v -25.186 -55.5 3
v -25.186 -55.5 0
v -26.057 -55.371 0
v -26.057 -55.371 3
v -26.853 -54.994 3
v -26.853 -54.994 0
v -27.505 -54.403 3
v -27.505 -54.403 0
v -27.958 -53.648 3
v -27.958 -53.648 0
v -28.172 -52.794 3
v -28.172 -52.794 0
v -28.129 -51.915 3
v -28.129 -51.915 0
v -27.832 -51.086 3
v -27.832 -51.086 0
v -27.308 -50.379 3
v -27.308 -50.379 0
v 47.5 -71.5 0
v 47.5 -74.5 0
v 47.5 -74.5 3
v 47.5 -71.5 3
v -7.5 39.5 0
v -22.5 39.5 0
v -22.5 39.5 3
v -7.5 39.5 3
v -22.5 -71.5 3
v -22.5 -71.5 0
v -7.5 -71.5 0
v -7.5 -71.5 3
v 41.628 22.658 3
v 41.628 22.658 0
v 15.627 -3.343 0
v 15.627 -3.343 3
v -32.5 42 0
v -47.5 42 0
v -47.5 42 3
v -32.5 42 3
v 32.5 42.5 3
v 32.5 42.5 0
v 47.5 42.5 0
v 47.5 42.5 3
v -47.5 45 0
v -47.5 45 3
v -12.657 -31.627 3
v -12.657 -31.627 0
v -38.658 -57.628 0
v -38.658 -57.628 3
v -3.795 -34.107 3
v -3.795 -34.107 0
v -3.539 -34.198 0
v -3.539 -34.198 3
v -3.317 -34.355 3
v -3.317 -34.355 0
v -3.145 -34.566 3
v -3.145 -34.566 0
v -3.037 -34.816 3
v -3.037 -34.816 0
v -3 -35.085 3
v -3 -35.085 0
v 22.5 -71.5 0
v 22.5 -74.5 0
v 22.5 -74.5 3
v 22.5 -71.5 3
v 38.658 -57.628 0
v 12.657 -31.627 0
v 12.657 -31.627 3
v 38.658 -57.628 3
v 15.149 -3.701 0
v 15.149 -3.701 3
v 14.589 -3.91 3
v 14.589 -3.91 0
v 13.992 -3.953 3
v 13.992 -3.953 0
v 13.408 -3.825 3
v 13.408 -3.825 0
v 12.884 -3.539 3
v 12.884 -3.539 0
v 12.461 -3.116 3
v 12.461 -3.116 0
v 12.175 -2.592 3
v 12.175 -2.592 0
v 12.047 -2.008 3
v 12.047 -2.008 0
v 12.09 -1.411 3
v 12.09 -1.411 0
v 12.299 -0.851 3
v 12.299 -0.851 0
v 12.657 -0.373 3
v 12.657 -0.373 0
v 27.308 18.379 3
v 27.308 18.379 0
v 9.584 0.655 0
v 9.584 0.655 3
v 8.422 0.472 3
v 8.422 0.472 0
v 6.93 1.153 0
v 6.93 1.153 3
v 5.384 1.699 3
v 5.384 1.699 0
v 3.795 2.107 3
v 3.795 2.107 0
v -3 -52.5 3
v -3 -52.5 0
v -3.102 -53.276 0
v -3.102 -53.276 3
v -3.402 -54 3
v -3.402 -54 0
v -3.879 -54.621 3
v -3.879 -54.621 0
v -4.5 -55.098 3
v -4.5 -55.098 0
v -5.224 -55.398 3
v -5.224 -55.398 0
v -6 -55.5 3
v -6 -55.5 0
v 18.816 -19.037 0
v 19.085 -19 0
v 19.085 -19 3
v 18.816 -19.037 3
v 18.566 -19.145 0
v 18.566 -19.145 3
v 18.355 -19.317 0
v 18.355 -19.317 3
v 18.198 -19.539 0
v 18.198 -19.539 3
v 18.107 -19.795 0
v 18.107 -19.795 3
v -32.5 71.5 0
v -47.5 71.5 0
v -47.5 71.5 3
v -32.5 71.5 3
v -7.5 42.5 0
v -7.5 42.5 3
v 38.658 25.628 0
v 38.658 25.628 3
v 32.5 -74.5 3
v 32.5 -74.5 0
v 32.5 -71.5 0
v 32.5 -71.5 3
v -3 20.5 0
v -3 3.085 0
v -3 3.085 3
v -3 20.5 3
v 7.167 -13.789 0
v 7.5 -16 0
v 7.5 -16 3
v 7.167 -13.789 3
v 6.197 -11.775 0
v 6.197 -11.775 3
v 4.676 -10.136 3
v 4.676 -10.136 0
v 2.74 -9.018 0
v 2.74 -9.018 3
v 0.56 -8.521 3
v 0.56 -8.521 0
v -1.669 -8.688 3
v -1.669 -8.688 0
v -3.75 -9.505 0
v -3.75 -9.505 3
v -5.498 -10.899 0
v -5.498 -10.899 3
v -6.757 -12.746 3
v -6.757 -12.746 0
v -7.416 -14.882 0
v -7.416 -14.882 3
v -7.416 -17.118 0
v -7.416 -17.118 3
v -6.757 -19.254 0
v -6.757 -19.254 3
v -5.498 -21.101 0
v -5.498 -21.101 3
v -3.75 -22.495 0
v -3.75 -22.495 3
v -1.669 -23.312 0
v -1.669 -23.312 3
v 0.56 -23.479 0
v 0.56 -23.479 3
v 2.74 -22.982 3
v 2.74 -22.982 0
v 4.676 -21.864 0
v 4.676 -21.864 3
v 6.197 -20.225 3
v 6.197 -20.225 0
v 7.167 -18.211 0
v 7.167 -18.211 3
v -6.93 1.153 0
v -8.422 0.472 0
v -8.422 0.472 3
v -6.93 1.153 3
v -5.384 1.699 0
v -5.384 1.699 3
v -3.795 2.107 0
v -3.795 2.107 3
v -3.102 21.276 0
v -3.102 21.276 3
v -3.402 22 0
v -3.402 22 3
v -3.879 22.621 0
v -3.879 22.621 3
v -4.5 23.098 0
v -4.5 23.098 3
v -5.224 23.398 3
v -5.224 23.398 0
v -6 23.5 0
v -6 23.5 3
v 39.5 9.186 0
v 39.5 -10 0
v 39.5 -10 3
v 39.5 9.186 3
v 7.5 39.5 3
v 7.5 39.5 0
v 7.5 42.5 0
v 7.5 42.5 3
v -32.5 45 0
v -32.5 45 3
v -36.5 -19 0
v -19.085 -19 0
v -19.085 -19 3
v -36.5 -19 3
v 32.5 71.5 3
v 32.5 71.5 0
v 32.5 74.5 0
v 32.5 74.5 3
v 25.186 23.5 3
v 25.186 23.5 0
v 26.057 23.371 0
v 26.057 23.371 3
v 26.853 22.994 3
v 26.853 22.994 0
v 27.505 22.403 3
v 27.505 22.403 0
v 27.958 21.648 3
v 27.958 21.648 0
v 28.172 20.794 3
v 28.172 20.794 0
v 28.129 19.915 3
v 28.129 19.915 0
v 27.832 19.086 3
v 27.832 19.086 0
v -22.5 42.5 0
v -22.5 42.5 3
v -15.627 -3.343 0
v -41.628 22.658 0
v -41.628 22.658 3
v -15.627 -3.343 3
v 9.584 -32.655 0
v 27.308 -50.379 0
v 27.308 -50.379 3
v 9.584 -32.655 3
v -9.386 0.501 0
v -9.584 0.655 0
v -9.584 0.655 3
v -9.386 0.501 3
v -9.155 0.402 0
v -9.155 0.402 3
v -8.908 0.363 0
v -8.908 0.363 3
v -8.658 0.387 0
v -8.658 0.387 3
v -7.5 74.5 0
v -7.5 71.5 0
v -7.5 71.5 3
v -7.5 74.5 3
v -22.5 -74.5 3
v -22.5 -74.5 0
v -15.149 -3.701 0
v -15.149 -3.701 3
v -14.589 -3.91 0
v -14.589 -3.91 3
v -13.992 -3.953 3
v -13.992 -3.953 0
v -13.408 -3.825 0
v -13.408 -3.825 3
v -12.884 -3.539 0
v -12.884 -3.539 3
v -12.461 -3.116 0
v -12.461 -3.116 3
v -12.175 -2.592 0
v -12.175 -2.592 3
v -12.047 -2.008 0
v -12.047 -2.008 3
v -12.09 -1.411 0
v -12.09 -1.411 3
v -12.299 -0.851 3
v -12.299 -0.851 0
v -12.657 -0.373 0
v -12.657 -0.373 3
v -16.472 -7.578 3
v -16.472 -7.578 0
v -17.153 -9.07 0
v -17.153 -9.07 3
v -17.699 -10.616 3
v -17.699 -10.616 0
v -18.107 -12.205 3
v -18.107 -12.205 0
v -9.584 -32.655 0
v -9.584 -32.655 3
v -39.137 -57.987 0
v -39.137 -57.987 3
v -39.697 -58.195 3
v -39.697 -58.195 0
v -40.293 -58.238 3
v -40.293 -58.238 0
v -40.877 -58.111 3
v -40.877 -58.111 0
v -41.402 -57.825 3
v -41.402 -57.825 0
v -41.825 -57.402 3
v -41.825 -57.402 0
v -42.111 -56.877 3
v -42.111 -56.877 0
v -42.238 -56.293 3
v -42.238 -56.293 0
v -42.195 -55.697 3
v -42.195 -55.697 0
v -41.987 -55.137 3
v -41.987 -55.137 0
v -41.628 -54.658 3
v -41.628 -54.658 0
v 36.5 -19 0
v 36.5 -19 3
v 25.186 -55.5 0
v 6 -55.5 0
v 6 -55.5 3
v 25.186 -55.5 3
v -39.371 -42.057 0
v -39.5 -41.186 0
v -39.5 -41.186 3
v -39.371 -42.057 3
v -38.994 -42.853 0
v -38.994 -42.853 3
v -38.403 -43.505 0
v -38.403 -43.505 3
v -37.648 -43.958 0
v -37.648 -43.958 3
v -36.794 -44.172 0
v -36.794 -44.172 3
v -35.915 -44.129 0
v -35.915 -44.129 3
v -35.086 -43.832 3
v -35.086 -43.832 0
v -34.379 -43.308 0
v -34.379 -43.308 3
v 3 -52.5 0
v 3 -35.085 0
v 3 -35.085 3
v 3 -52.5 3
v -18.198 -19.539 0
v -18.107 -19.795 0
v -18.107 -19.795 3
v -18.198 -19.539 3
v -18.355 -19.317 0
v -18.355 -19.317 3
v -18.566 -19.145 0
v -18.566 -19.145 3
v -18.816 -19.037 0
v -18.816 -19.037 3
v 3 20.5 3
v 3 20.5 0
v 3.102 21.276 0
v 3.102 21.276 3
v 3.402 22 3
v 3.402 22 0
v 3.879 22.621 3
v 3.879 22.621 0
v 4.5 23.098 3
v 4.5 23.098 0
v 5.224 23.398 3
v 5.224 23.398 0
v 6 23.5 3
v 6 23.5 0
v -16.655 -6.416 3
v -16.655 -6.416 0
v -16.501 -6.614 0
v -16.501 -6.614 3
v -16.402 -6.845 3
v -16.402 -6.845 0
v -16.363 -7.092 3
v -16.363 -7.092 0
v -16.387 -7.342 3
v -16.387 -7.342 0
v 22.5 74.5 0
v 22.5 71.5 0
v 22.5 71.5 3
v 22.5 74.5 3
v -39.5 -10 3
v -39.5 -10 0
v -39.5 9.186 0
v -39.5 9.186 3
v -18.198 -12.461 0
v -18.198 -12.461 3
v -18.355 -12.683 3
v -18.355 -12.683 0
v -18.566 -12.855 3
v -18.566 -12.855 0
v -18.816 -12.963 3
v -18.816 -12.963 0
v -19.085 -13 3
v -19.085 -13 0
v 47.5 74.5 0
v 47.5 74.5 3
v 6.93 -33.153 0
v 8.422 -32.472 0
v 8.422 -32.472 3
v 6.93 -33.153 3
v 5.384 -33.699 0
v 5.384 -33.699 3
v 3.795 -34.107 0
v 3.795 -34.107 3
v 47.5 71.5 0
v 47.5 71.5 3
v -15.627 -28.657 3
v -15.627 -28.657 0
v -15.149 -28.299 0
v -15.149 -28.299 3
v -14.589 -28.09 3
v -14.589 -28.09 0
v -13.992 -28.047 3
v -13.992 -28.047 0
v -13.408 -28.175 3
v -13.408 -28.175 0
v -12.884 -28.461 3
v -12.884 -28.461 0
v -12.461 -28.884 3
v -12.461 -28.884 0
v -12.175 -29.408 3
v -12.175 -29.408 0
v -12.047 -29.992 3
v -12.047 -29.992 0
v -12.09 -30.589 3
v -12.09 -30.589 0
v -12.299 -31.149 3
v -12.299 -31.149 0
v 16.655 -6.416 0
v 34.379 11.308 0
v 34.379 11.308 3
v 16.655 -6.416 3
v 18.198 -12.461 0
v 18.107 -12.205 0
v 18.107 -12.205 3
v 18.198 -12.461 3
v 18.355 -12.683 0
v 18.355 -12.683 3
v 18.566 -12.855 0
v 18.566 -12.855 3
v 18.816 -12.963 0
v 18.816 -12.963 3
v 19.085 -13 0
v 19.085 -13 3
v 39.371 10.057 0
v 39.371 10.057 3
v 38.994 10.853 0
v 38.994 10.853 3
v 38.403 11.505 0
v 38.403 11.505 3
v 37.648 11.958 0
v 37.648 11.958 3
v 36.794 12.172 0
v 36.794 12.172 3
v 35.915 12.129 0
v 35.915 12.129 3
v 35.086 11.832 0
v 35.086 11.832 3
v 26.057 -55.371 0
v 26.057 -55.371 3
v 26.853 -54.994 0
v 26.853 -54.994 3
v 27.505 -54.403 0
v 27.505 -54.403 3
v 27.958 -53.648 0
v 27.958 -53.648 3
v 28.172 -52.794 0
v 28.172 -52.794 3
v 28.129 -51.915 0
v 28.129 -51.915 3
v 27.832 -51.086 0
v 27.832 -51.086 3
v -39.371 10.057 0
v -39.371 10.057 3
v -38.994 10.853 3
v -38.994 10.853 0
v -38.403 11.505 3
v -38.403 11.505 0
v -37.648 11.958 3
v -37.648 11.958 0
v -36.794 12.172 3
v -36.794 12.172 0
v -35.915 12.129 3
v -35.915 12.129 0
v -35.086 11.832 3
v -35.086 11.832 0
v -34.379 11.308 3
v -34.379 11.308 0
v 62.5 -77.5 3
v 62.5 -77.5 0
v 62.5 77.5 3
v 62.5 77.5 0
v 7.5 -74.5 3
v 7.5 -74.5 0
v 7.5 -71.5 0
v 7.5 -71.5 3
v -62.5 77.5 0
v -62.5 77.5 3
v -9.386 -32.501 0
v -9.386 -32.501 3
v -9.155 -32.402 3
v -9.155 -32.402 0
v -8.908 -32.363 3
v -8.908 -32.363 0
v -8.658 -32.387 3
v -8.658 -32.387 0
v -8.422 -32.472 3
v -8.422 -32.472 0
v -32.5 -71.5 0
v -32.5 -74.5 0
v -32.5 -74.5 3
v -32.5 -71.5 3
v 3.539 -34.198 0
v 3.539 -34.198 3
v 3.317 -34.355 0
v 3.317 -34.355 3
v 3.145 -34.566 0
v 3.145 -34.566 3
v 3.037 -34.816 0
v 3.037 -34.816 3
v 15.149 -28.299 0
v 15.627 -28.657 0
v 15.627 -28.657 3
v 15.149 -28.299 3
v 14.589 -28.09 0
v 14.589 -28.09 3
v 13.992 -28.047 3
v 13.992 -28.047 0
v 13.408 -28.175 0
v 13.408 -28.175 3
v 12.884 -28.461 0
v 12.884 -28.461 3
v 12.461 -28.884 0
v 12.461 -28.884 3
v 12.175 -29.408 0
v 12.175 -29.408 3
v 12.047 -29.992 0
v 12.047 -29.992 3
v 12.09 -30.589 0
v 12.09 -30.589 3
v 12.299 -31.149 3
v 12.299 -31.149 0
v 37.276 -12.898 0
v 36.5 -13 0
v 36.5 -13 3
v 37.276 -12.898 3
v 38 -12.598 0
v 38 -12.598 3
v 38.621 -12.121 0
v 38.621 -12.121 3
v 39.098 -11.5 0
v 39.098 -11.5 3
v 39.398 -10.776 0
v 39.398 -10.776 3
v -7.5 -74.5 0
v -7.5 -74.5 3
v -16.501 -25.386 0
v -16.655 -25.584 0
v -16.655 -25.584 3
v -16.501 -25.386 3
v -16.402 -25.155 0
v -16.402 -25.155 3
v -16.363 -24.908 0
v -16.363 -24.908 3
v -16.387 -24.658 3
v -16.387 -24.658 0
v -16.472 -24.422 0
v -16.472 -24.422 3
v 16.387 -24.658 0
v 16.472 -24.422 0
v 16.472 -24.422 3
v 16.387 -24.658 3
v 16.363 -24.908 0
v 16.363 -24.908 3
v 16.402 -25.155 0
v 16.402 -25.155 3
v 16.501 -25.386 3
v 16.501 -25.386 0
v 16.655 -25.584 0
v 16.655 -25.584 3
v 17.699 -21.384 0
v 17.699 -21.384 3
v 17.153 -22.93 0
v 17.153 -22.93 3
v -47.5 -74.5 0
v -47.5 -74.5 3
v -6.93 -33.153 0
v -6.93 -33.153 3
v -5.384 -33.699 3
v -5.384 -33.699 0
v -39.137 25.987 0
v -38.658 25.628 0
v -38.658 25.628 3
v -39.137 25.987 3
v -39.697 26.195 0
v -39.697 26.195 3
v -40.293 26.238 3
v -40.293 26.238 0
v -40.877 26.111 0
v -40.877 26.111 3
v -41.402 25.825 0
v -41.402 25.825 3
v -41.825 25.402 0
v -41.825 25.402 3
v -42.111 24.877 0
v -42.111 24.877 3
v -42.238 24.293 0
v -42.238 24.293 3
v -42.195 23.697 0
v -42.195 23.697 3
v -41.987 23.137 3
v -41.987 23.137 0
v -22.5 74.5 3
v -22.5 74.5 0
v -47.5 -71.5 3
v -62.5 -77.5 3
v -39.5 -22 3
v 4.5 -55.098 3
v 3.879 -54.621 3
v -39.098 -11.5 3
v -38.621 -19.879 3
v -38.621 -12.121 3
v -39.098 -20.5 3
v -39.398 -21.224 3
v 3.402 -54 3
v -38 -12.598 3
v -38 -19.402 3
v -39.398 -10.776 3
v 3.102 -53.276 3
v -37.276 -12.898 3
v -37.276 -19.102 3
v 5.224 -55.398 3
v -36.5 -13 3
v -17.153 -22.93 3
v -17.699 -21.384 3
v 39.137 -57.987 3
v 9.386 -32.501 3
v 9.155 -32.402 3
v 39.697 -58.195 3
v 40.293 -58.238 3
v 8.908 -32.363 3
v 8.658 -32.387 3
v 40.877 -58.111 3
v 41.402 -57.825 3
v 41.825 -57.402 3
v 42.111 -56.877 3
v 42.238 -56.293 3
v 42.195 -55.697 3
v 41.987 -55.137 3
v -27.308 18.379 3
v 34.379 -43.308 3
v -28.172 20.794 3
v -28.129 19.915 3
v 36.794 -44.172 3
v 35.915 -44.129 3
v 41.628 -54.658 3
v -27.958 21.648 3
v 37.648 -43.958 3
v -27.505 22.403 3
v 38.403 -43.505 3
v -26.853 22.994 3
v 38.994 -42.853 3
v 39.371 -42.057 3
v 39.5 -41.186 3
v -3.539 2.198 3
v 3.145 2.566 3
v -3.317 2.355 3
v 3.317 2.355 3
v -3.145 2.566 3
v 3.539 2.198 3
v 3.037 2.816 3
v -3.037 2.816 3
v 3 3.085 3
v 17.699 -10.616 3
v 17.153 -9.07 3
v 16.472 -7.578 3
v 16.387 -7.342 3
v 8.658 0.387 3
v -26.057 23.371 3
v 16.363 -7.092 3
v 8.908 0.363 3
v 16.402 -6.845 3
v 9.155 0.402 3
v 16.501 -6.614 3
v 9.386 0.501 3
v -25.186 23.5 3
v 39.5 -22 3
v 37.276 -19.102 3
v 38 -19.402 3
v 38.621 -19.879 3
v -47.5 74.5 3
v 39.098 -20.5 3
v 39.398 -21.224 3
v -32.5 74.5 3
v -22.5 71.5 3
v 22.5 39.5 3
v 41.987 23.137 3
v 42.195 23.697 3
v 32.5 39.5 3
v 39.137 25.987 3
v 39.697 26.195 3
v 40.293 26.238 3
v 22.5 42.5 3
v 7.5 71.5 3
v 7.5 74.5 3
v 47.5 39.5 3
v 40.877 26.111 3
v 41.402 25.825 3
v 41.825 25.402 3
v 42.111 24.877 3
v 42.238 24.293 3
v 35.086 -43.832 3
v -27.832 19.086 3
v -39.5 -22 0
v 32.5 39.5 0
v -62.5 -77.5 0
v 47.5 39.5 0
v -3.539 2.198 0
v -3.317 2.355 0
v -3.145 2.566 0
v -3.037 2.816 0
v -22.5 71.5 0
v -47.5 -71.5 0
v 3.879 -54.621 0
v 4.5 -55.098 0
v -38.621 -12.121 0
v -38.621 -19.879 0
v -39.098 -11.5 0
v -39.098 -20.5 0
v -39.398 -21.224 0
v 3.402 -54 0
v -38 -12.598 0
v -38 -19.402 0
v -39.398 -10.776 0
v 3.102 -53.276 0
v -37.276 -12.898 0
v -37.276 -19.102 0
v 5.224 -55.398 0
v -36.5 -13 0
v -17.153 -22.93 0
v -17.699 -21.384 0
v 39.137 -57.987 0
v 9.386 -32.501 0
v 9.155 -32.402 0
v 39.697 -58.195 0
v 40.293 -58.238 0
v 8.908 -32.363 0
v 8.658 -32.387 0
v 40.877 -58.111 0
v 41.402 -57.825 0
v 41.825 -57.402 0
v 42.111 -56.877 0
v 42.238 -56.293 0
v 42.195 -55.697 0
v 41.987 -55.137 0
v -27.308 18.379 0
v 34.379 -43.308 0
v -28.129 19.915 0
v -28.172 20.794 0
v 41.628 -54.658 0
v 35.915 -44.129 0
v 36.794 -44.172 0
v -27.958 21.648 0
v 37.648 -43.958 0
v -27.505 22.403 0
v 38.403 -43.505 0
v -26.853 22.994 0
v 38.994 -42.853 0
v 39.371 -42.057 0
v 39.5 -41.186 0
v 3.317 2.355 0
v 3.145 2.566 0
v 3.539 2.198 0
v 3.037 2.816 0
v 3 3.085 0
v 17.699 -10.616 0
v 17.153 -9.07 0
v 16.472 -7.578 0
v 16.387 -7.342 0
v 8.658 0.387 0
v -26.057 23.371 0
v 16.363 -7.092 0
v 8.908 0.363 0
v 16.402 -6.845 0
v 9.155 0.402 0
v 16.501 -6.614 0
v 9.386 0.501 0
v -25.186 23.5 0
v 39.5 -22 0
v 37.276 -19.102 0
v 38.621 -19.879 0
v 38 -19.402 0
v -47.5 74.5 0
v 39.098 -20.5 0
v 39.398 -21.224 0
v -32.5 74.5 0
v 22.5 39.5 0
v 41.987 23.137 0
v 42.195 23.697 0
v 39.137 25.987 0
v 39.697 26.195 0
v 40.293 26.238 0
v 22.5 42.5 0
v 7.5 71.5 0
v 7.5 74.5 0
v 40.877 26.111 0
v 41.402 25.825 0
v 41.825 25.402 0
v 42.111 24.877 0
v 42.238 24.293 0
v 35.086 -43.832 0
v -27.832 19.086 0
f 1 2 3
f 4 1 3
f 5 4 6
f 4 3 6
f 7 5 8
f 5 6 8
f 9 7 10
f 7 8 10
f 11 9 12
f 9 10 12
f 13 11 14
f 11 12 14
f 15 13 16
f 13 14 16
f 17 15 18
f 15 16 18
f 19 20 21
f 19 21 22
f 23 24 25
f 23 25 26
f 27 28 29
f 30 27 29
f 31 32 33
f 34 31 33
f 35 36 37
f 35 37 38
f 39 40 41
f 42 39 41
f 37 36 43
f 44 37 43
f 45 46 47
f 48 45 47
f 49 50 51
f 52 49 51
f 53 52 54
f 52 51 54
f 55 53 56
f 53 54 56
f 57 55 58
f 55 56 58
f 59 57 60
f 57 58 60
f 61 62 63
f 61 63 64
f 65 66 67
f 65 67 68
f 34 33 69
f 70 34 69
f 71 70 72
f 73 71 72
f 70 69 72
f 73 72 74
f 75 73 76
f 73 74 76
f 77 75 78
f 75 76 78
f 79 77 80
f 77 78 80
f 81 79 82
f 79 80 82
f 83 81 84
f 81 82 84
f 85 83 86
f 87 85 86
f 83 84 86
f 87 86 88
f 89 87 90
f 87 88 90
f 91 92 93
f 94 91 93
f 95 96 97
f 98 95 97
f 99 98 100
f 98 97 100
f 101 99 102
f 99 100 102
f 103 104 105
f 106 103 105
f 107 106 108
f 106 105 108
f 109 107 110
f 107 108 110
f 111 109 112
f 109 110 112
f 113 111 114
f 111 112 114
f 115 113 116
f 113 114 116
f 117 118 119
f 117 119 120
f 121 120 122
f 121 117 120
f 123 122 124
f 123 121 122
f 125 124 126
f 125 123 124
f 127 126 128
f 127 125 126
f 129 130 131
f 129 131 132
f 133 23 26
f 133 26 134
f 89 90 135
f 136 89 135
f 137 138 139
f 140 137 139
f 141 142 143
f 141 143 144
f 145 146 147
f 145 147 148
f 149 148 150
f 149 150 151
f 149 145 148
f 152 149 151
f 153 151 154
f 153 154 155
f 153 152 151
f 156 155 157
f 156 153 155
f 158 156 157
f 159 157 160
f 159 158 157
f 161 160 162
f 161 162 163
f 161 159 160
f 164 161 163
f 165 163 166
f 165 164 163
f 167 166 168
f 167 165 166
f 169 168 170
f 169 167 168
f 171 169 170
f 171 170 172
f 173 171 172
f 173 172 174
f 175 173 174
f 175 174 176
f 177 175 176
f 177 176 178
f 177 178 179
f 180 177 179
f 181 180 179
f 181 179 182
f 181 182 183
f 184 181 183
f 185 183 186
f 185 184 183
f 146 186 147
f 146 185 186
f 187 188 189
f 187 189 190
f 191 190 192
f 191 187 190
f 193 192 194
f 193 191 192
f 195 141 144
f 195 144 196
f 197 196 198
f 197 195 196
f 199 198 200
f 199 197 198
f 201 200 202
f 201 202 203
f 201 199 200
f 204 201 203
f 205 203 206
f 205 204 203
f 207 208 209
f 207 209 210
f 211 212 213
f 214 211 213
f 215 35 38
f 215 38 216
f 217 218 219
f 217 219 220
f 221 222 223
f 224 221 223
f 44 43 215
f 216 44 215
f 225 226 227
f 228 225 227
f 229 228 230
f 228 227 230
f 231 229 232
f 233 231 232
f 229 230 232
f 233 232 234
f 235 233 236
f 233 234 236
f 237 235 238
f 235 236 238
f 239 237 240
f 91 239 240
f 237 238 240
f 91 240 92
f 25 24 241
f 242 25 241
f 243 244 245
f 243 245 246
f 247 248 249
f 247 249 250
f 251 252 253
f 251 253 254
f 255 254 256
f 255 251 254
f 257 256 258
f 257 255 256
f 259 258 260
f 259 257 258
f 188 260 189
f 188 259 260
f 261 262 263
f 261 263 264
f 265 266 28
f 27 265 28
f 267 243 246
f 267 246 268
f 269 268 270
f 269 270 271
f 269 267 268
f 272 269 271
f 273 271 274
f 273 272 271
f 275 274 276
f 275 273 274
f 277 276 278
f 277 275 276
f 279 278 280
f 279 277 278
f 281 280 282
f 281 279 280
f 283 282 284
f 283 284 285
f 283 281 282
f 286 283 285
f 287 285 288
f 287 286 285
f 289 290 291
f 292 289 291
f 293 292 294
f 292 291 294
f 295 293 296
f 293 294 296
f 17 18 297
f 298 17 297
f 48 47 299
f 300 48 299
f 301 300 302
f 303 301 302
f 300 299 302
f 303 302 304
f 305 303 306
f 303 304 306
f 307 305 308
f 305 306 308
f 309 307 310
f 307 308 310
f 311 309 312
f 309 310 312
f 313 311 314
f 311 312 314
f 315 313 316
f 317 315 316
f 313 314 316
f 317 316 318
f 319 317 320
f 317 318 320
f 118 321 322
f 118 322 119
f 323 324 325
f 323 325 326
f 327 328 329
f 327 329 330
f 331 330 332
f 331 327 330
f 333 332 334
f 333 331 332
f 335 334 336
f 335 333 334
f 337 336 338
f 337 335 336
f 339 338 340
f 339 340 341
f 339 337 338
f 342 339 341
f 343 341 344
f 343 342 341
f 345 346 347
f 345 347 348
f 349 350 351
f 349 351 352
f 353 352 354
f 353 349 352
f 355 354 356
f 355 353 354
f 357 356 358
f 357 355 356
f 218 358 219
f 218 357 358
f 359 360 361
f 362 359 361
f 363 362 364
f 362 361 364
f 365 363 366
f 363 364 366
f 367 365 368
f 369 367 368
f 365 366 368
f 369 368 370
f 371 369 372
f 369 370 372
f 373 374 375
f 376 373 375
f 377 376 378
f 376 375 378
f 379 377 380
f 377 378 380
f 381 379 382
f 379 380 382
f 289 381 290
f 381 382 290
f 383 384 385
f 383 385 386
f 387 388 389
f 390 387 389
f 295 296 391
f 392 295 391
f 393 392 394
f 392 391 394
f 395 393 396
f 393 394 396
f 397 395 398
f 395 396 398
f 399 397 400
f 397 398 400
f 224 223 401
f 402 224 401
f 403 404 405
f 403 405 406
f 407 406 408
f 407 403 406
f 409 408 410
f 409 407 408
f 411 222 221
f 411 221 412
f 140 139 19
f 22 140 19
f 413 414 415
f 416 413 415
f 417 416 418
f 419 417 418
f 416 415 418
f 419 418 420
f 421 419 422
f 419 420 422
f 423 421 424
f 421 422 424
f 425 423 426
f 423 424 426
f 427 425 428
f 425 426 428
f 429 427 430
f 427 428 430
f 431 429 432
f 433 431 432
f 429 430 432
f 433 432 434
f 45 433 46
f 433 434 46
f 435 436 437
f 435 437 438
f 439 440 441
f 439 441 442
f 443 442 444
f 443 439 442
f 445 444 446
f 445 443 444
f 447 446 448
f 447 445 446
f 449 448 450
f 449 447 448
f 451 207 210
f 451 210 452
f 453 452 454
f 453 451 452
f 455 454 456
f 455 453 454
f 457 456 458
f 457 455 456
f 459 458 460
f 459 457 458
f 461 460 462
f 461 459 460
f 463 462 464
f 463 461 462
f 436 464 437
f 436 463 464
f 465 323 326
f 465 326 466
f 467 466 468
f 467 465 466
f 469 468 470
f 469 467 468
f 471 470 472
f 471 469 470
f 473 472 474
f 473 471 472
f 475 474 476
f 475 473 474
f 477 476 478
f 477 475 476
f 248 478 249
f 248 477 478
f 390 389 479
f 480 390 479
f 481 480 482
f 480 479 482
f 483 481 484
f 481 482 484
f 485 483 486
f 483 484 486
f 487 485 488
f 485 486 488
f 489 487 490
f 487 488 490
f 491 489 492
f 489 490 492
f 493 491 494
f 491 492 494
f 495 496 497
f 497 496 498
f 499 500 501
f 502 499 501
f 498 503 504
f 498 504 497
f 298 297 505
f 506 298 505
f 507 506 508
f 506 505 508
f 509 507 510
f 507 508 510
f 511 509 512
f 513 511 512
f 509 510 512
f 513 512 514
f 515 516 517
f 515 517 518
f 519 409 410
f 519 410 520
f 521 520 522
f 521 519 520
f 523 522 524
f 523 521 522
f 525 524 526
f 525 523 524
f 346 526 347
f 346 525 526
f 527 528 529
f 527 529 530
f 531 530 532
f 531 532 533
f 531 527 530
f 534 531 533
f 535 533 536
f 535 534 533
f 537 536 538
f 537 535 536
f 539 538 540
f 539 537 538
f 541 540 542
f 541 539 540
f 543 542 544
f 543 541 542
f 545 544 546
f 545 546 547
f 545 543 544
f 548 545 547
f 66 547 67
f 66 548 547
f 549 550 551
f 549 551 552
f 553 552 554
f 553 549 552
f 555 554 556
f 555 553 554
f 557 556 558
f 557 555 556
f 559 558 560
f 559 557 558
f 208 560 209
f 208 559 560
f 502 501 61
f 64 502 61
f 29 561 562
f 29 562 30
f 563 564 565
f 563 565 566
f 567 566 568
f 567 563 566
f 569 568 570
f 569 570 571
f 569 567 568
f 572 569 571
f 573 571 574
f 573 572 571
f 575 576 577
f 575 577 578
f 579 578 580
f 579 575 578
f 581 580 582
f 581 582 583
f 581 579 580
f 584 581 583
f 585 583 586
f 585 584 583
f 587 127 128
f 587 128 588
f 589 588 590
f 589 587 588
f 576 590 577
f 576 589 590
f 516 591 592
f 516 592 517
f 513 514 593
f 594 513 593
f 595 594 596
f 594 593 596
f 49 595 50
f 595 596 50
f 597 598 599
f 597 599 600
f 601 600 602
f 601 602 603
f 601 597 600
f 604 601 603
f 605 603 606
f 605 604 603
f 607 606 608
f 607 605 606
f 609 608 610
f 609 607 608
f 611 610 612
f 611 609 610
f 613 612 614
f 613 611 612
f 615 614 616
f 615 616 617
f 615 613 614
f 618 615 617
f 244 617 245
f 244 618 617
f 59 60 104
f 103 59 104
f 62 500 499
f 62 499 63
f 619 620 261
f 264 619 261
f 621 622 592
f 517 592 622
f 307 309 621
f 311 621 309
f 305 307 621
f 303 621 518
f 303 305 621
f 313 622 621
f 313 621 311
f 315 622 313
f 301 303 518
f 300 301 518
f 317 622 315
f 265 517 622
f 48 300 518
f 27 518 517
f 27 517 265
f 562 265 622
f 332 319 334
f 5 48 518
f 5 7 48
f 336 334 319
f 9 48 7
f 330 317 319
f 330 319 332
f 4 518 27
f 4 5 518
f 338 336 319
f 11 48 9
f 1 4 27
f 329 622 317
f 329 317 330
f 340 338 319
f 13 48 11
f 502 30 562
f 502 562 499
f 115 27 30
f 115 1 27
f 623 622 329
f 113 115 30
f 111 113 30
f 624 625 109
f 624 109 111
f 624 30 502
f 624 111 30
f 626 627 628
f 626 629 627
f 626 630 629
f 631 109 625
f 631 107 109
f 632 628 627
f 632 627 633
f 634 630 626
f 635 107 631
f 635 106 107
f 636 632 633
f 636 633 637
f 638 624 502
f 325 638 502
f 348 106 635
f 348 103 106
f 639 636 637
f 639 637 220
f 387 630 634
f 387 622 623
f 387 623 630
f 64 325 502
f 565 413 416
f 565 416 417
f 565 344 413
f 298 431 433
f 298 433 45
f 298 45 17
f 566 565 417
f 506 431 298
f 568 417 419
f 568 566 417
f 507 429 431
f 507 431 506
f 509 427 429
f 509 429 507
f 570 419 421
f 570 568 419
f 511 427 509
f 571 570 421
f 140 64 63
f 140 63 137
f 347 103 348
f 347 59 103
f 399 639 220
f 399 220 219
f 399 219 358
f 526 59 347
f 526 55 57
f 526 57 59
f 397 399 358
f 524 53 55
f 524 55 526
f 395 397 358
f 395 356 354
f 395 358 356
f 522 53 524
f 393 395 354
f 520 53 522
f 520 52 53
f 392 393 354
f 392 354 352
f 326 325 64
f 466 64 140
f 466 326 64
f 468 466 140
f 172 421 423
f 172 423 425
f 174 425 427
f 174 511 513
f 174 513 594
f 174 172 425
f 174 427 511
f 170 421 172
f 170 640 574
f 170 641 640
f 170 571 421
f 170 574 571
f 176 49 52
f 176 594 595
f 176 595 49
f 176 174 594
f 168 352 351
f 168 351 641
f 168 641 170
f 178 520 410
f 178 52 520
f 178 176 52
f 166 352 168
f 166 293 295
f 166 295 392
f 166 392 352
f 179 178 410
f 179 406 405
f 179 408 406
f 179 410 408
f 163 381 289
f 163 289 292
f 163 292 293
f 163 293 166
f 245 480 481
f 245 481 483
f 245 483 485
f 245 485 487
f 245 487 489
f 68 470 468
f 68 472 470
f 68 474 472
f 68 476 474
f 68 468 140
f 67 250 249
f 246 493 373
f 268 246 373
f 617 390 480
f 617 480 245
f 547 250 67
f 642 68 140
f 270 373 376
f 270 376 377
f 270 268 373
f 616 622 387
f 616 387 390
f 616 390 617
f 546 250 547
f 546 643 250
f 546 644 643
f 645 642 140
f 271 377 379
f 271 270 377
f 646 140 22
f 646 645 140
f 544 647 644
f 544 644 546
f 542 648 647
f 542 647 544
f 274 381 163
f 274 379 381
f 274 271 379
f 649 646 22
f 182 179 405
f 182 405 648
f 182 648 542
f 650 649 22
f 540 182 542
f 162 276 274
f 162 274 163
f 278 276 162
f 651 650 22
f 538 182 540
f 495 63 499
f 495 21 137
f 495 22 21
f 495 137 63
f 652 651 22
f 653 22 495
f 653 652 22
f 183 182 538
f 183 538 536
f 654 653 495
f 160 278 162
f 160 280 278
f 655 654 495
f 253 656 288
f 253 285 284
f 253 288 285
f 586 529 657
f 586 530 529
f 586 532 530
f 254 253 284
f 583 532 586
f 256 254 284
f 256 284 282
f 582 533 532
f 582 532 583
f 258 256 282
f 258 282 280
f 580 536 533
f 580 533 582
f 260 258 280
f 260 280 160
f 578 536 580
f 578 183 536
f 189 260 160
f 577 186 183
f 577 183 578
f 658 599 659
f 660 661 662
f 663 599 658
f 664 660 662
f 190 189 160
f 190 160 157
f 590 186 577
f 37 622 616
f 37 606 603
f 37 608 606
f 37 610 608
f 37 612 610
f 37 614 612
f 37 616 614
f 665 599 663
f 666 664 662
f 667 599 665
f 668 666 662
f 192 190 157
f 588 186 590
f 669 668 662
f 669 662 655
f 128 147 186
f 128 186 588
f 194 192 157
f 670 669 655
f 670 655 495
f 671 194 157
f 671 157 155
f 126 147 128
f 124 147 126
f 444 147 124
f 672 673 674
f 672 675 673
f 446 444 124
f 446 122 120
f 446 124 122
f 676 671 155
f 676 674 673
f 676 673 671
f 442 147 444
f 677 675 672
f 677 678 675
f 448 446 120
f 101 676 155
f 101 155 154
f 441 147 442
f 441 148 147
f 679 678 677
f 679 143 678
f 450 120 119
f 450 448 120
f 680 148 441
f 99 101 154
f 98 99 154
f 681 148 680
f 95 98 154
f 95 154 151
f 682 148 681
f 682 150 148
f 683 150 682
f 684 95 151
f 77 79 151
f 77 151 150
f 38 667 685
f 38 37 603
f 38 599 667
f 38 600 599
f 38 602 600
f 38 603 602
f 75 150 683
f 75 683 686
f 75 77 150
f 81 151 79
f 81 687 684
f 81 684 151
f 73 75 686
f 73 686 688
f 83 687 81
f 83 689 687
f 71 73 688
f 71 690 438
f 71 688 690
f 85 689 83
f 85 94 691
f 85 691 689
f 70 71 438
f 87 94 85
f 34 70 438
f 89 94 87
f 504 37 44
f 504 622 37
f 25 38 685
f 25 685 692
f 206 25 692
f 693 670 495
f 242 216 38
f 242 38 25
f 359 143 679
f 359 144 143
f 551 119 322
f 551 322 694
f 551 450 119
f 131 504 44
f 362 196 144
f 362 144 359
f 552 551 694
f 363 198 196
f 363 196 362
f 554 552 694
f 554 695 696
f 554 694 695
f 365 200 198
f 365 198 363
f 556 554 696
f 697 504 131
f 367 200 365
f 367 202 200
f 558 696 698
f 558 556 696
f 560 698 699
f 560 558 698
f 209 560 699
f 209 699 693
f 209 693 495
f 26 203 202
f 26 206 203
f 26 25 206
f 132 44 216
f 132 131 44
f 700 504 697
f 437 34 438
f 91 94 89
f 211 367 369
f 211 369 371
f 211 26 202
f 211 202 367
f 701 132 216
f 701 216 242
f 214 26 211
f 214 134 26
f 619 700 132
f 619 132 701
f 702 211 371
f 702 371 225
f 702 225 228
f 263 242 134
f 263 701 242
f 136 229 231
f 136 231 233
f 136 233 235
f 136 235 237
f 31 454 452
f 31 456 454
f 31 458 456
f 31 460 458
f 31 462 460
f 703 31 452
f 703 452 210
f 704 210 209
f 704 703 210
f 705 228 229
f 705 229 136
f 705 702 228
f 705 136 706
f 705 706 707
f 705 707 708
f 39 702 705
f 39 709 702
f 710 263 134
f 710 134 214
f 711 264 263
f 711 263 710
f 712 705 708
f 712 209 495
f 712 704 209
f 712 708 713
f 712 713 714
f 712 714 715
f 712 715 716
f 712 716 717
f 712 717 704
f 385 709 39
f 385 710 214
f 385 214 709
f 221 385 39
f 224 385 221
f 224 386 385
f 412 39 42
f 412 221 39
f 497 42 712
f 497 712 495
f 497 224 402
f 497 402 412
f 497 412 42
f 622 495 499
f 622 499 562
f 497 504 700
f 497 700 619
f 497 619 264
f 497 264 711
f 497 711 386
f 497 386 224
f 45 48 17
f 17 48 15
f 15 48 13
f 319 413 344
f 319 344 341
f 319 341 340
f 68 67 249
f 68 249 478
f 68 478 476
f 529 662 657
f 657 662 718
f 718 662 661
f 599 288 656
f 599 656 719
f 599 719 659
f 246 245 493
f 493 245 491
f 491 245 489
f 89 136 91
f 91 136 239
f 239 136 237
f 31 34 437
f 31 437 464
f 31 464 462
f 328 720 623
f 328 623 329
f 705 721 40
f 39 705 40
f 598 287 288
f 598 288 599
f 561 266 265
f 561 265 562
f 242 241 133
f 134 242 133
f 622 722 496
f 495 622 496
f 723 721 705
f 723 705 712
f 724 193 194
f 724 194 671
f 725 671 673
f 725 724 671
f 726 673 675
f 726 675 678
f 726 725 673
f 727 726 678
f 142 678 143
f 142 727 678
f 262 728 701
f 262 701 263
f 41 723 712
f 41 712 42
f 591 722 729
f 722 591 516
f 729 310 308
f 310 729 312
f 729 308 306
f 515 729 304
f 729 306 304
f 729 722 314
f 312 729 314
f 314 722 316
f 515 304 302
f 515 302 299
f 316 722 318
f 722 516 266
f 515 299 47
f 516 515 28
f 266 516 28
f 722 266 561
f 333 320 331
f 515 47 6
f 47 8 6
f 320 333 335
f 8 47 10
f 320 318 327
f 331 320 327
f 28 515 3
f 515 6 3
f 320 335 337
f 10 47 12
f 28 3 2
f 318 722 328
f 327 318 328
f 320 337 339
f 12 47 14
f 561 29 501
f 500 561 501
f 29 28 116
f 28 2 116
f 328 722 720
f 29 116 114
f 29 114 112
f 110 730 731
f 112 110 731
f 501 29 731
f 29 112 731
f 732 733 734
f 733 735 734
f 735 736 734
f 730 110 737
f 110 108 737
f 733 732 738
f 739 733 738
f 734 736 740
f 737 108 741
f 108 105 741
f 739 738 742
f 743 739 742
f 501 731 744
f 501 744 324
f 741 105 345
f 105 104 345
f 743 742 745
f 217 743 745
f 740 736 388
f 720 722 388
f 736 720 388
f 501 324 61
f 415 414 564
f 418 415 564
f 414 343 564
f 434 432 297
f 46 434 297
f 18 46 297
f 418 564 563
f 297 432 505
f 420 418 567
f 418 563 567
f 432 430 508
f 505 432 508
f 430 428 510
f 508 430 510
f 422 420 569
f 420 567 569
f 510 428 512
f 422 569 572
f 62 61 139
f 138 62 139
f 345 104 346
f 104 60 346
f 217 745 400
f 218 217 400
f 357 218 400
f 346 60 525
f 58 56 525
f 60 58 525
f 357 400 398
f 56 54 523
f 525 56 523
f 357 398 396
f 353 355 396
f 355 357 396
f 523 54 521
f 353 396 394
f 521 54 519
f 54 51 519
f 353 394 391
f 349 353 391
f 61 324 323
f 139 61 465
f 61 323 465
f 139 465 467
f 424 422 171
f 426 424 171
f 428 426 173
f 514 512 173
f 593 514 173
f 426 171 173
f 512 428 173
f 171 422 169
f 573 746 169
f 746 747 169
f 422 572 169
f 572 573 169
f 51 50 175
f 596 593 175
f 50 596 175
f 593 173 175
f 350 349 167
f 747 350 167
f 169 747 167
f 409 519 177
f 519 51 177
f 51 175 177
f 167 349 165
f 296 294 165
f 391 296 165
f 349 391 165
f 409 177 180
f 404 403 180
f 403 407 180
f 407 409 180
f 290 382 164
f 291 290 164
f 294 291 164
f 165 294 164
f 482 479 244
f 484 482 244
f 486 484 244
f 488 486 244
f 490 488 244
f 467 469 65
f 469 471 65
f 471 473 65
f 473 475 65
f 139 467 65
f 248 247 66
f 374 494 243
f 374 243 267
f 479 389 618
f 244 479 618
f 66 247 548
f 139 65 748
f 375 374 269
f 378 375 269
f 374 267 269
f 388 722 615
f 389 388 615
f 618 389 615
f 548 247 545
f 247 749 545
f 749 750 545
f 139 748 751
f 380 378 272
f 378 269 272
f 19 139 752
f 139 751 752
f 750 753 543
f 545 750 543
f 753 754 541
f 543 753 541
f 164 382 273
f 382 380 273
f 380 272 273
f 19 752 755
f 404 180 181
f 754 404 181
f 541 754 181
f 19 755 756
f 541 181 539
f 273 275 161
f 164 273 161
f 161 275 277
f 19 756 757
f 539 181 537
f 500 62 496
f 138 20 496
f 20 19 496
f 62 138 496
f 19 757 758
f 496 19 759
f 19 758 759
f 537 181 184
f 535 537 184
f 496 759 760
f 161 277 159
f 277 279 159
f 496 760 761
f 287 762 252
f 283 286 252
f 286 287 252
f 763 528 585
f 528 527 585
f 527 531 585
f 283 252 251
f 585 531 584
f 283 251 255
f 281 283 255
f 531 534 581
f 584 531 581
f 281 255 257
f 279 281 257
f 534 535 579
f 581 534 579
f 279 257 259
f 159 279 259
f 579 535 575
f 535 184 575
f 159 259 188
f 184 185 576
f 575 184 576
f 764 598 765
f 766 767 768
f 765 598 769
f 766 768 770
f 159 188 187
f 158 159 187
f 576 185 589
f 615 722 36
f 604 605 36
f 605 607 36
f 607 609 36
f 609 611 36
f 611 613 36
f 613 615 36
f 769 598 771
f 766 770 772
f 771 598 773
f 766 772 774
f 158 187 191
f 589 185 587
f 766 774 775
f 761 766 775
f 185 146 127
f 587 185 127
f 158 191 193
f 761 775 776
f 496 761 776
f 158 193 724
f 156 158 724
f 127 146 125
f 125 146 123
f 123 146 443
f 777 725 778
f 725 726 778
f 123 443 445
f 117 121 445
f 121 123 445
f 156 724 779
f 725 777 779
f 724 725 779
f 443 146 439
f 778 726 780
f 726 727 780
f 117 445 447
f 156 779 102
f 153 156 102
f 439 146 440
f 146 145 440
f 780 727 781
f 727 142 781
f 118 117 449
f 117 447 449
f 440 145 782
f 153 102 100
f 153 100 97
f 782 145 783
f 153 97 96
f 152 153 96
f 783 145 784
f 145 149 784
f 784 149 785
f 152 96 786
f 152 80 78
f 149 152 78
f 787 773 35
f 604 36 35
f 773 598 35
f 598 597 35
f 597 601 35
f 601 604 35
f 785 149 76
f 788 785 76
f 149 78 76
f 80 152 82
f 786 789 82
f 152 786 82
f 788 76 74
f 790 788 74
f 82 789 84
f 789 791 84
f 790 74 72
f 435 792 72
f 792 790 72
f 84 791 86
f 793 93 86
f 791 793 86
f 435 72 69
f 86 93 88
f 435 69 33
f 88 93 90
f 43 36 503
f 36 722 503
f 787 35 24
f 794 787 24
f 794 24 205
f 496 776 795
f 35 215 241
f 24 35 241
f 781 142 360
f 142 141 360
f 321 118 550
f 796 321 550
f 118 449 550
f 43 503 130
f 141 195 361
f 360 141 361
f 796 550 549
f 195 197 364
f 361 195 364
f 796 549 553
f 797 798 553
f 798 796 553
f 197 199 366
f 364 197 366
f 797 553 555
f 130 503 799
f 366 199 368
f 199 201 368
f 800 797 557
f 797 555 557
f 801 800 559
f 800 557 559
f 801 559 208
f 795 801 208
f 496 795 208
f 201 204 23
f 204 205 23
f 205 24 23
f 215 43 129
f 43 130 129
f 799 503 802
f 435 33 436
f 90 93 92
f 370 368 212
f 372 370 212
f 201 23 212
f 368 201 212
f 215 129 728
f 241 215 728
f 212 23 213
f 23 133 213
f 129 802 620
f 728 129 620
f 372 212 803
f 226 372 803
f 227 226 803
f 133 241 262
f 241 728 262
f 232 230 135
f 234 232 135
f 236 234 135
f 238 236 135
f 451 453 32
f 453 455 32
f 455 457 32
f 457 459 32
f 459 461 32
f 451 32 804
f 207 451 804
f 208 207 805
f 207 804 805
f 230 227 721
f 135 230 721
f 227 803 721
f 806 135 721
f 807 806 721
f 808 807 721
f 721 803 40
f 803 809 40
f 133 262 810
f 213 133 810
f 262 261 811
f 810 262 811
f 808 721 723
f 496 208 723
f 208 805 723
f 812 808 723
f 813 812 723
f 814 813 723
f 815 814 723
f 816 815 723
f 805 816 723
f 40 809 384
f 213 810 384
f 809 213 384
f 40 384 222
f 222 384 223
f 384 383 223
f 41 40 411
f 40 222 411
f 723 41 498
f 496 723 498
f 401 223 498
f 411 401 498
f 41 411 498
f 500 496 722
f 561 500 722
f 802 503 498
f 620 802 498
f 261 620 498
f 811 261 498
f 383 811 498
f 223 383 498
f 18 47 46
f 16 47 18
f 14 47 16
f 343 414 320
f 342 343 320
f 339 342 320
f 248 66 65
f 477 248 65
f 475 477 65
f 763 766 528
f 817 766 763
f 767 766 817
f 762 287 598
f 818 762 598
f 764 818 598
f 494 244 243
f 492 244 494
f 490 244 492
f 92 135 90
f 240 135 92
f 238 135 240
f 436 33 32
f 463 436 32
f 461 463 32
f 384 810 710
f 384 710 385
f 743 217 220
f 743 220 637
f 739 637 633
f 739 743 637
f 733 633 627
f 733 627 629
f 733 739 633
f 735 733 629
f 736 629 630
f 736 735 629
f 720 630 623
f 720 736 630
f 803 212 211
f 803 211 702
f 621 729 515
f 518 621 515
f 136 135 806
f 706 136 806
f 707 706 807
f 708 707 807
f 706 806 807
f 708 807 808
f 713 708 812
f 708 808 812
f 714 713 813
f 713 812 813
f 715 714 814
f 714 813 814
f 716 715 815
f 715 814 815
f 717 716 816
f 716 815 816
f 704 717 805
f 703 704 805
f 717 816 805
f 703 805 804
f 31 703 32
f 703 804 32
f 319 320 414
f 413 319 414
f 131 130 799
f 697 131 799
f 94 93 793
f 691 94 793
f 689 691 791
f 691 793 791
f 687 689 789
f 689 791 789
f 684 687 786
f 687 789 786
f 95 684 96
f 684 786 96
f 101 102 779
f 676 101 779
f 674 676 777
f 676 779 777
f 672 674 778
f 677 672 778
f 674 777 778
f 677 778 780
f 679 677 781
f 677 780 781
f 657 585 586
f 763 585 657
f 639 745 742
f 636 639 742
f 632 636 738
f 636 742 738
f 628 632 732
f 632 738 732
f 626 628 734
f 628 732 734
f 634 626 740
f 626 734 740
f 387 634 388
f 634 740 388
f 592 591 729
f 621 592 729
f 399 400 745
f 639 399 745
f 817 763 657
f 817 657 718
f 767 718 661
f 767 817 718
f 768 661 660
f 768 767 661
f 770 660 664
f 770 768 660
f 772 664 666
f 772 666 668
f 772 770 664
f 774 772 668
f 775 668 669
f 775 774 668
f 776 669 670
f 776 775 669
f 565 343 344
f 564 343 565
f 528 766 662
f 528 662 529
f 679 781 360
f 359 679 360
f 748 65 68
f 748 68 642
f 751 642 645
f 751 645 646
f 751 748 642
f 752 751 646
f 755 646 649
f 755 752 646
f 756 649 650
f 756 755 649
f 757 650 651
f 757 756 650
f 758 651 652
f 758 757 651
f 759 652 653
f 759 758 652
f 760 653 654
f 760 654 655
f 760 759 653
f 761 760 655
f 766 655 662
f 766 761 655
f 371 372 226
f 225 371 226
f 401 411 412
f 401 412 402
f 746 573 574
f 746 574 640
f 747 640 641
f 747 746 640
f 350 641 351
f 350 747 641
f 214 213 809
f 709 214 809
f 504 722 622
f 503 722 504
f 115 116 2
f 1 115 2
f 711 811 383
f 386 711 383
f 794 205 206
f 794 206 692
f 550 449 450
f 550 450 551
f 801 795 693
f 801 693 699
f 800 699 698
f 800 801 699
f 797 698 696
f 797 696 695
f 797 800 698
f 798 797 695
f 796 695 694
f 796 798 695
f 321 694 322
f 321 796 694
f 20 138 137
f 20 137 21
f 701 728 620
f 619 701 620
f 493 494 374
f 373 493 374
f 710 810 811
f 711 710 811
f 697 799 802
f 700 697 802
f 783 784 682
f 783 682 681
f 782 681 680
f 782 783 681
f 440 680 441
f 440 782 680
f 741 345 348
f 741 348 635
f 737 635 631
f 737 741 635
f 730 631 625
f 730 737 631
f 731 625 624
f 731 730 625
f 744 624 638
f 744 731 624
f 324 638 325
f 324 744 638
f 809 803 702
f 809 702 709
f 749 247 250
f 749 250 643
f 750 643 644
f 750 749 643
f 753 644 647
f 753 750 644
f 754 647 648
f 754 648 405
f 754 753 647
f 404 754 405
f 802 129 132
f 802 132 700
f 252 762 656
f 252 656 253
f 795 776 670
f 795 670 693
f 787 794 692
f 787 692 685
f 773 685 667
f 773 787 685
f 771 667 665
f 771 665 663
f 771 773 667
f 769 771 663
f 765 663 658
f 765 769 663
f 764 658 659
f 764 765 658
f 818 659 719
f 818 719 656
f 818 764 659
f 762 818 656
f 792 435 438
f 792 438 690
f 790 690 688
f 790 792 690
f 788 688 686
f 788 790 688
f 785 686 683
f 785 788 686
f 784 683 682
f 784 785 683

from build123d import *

# Parameters (mm, degrees)
SKETCH1_W           = 125
SKETCH1_H           = 155
SKETCH1_R           = 7.5
SKETCH1_W_2         = 15
SKETCH1_H_2         = 3
BOSS_EXTRUDE1_DEPTH = 3


with BuildPart() as part:
    # Sketch1 → Boss-Extrude1 (new body)
    with BuildSketch(Plane.XY):
        Rectangle(SKETCH1_W, SKETCH1_H)
        with Locations((0, -16)):
            Circle(SKETCH1_R, mode=Mode.SUBTRACT)
        with Locations((15, 73)):
            Rectangle(SKETCH1_W_2, SKETCH1_H_2, mode=Mode.SUBTRACT)
        with Locations((-40, 73)):
            Rectangle(SKETCH1_W_2, SKETCH1_H_2, mode=Mode.SUBTRACT)
        with Locations((-15, 73)):
            Rectangle(SKETCH1_W_2, SKETCH1_H_2, mode=Mode.SUBTRACT)
        with Locations((40, 73)):
            Rectangle(SKETCH1_W_2, SKETCH1_H_2, mode=Mode.SUBTRACT)
        with Locations((40, -73)):
            Rectangle(SKETCH1_W_2, SKETCH1_H_2, mode=Mode.SUBTRACT)
        with Locations((15, -73)):
            Rectangle(SKETCH1_W_2, SKETCH1_H_2, mode=Mode.SUBTRACT)
        with Locations((-15, -73)):
            Rectangle(SKETCH1_W_2, SKETCH1_H_2, mode=Mode.SUBTRACT)
        with Locations((-40, -73)):
            Rectangle(SKETCH1_W_2, SKETCH1_H_2, mode=Mode.SUBTRACT)
        with Locations((15, 41)):
            Rectangle(SKETCH1_W_2, SKETCH1_H_2, mode=Mode.SUBTRACT)
        with Locations((-15, 41)):
            Rectangle(SKETCH1_W_2, SKETCH1_H_2, mode=Mode.SUBTRACT)
        with BuildLine():
            Line((39.5, -10), (39.5, 9.186291501))
            ThreePointArc((39.5, 9.186291501), (37.648050297, 11.957930099), (34.378679656, 11.307611845))
            Line((34.378679656, 11.307611845), (16.655175669, -6.415892143))
            ThreePointArc((16.655175669, -6.415892143), (16.374485428, -6.967252196), (16.471908992, -7.578229748))
            ThreePointArc((16.471908992, -7.578229748), (17.443347183, -9.83723771), (18.106599572, -12.205128205))
            ThreePointArc((18.106599572, -12.205128205), (18.454909512, -12.776250026), (19.085334684, -13))
            Line((19.085334684, -13), (36.5, -13))
            ThreePointArc((36.5, -13), (38.621320344, -12.121320344), (39.5, -10))
        make_face(mode=Mode.SUBTRACT)
        with BuildLine():
            Line((3, -35.085334684), (3, -52.5))
            ThreePointArc((3, -52.5), (3.878679656, -54.621320344), (6, -55.5))
            Line((6, -55.5), (25.186291501, -55.5))
            ThreePointArc((25.186291501, -55.5), (27.957930099, -53.648050297), (27.307611845, -50.378679656))
            Line((27.307611845, -50.378679656), (9.584107857, -32.655175669))
            ThreePointArc((9.584107857, -32.655175669), (9.032747804, -32.374485428), (8.421770252, -32.471908992))
            ThreePointArc((8.421770252, -32.471908992), (6.16276229, -33.443347183), (3.794871795, -34.106599572))
            ThreePointArc((3.794871795, -34.106599572), (3.223749974, -34.454909512), (3, -35.085334684))
        make_face(mode=Mode.SUBTRACT)
        with BuildLine():
            Line((16.655175669, -25.584107857), (34.378679656, -43.307611845))
            ThreePointArc((34.378679656, -43.307611845), (37.648050297, -43.957930099), (39.5, -41.186291501))
            Line((39.5, -41.186291501), (39.5, -22))
            ThreePointArc((39.5, -22), (38.621320344, -19.878679656), (36.5, -19))
            Line((36.5, -19), (19.085334684, -19))
            ThreePointArc((19.085334684, -19), (18.454909512, -19.223749974), (18.106599572, -19.794871795))
            ThreePointArc((18.106599572, -19.794871795), (17.443347183, -22.16276229), (16.471908992, -24.421770252))
            ThreePointArc((16.471908992, -24.421770252), (16.374485428, -25.032747804), (16.655175669, -25.584107857))
        make_face(mode=Mode.SUBTRACT)
        with BuildLine():
            Line((6, 23.5), (25.186291501, 23.5))
            ThreePointArc((25.186291501, 23.5), (27.957930099, 21.648050297), (27.307611845, 18.378679656))
            Line((27.307611845, 18.378679656), (9.584107857, 0.655175669))
            ThreePointArc((9.584107857, 0.655175669), (9.032747804, 0.374485428), (8.421770252, 0.471908992))
            ThreePointArc((8.421770252, 0.471908992), (6.16276229, 1.443347183), (3.794871795, 2.106599572))
            ThreePointArc((3.794871795, 2.106599572), (3.223749974, 2.454909512), (3, 3.085334684))
            Line((3, 3.085334684), (3, 20.5))
            ThreePointArc((3, 20.5), (3.878679656, 22.621320344), (6, 23.5))
        make_face(mode=Mode.SUBTRACT)
        with BuildLine():
            Line((-3, 3.085334684), (-3, 20.5))
            ThreePointArc((-3, 20.5), (-3.878679656, 22.621320344), (-6, 23.5))
            Line((-6, 23.5), (-25.186291501, 23.5))
            ThreePointArc((-25.186291501, 23.5), (-27.957930099, 21.648050297), (-27.307611845, 18.378679656))
            Line((-27.307611845, 18.378679656), (-9.584107857, 0.655175669))
            ThreePointArc((-9.584107857, 0.655175669), (-9.032747804, 0.374485428), (-8.421770252, 0.471908992))
            ThreePointArc((-8.421770252, 0.471908992), (-6.16276229, 1.443347183), (-3.794871795, 2.106599572))
            ThreePointArc((-3.794871795, 2.106599572), (-3.223749974, 2.454909512), (-3, 3.085334684))
        make_face(mode=Mode.SUBTRACT)
        with BuildLine():
            Line((-39.5, -10), (-39.5, 9.186291501))
            ThreePointArc((-39.5, 9.186291501), (-37.648050297, 11.957930099), (-34.378679656, 11.307611845))
            Line((-34.378679656, 11.307611845), (-16.655175669, -6.415892143))
            ThreePointArc((-16.655175669, -6.415892143), (-16.374485428, -6.967252196), (-16.471908992, -7.578229748))
            ThreePointArc((-16.471908992, -7.578229748), (-17.443347183, -9.83723771), (-18.106599572, -12.205128205))
            ThreePointArc((-18.106599572, -12.205128205), (-18.454909512, -12.776250026), (-19.085334684, -13))
            Line((-19.085334684, -13), (-36.5, -13))
            ThreePointArc((-36.5, -13), (-38.621320344, -12.121320344), (-39.5, -10))
        make_face(mode=Mode.SUBTRACT)
        with BuildLine():
            Line((-19.085334684, -19), (-36.5, -19))
            ThreePointArc((-36.5, -19), (-38.621320344, -19.878679656), (-39.5, -22))
            Line((-39.5, -22), (-39.5, -41.186291501))
            ThreePointArc((-39.5, -41.186291501), (-37.648050297, -43.957930099), (-34.378679656, -43.307611845))
            Line((-34.378679656, -43.307611845), (-16.655175669, -25.584107857))
            ThreePointArc((-16.655175669, -25.584107857), (-16.374485428, -25.032747804), (-16.471908992, -24.421770252))
            ThreePointArc((-16.471908992, -24.421770252), (-17.443347183, -22.16276229), (-18.106599572, -19.794871795))
            ThreePointArc((-18.106599572, -19.794871795), (-18.454909512, -19.223749974), (-19.085334684, -19))
        make_face(mode=Mode.SUBTRACT)
        with BuildLine():
            Line((-3, -35.085334684), (-3, -52.5))
            ThreePointArc((-3, -52.5), (-3.878679656, -54.621320344), (-6, -55.5))
            Line((-6, -55.5), (-25.186291501, -55.5))
            ThreePointArc((-25.186291501, -55.5), (-27.957930099, -53.648050297), (-27.307611845, -50.378679656))
            Line((-27.307611845, -50.378679656), (-9.584107857, -32.655175669))
            ThreePointArc((-9.584107857, -32.655175669), (-9.032747804, -32.374485428), (-8.421770252, -32.471908992))
            ThreePointArc((-8.421770252, -32.471908992), (-6.16276229, -33.443347183), (-3.794871795, -34.106599572))
            ThreePointArc((-3.794871795, -34.106599572), (-3.223749974, -34.454909512), (-3, -35.085334684))
        make_face(mode=Mode.SUBTRACT)
        with BuildLine():
            Line((12.657211383, -0.372940136), (38.658474042, 25.628322523))
            ThreePointArc((38.658474042, 25.628322523), (41.628322523, 25.628322523), (41.628322523, 22.658474042))
            Line((41.628322523, 22.658474042), (15.627059864, -3.342788617))
            ThreePointArc((15.627059864, -3.342788617), (12.657211383, -3.342788617), (12.657211383, -0.372940136))
        make_face(mode=Mode.SUBTRACT)
        with BuildLine():
            Line((12.657211383, -31.627059864), (38.658474042, -57.628322523))
            ThreePointArc((38.658474042, -57.628322523), (41.628322523, -57.628322523), (41.628322523, -54.658474042))
            Line((41.628322523, -54.658474042), (15.627059864, -28.657211383))
            ThreePointArc((15.627059864, -28.657211383), (12.657211383, -28.657211383), (12.657211383, -31.627059864))
        make_face(mode=Mode.SUBTRACT)
        with BuildLine():
            Line((-12.657211383, -31.627059864), (-38.658474042, -57.628322523))
            ThreePointArc((-38.658474042, -57.628322523), (-41.628322523, -57.628322523), (-41.628322523, -54.658474042))
            Line((-41.628322523, -54.658474042), (-15.627059864, -28.657211383))
            ThreePointArc((-15.627059864, -28.657211383), (-12.657211383, -28.657211383), (-12.657211383, -31.627059864))
        make_face(mode=Mode.SUBTRACT)
        with BuildLine():
            Line((-12.657211383, -0.372940136), (-38.658474042, 25.628322523))
            ThreePointArc((-38.658474042, 25.628322523), (-41.628322523, 25.628322523), (-41.628322523, 22.658474042))
            Line((-41.628322523, 22.658474042), (-15.627059864, -3.342788617))
            ThreePointArc((-15.627059864, -3.342788617), (-12.657211383, -3.342788617), (-12.657211383, -0.372940136))
        make_face(mode=Mode.SUBTRACT)
        with Locations((40, 41)):
            Rectangle(SKETCH1_W_2, SKETCH1_H_2, mode=Mode.SUBTRACT)
        with Locations((-40, 43.5)):
            Rectangle(SKETCH1_W_2, SKETCH1_H_2, mode=Mode.SUBTRACT)
    extrude(amount=BOSS_EXTRUDE1_DEPTH)


solid = part.part
